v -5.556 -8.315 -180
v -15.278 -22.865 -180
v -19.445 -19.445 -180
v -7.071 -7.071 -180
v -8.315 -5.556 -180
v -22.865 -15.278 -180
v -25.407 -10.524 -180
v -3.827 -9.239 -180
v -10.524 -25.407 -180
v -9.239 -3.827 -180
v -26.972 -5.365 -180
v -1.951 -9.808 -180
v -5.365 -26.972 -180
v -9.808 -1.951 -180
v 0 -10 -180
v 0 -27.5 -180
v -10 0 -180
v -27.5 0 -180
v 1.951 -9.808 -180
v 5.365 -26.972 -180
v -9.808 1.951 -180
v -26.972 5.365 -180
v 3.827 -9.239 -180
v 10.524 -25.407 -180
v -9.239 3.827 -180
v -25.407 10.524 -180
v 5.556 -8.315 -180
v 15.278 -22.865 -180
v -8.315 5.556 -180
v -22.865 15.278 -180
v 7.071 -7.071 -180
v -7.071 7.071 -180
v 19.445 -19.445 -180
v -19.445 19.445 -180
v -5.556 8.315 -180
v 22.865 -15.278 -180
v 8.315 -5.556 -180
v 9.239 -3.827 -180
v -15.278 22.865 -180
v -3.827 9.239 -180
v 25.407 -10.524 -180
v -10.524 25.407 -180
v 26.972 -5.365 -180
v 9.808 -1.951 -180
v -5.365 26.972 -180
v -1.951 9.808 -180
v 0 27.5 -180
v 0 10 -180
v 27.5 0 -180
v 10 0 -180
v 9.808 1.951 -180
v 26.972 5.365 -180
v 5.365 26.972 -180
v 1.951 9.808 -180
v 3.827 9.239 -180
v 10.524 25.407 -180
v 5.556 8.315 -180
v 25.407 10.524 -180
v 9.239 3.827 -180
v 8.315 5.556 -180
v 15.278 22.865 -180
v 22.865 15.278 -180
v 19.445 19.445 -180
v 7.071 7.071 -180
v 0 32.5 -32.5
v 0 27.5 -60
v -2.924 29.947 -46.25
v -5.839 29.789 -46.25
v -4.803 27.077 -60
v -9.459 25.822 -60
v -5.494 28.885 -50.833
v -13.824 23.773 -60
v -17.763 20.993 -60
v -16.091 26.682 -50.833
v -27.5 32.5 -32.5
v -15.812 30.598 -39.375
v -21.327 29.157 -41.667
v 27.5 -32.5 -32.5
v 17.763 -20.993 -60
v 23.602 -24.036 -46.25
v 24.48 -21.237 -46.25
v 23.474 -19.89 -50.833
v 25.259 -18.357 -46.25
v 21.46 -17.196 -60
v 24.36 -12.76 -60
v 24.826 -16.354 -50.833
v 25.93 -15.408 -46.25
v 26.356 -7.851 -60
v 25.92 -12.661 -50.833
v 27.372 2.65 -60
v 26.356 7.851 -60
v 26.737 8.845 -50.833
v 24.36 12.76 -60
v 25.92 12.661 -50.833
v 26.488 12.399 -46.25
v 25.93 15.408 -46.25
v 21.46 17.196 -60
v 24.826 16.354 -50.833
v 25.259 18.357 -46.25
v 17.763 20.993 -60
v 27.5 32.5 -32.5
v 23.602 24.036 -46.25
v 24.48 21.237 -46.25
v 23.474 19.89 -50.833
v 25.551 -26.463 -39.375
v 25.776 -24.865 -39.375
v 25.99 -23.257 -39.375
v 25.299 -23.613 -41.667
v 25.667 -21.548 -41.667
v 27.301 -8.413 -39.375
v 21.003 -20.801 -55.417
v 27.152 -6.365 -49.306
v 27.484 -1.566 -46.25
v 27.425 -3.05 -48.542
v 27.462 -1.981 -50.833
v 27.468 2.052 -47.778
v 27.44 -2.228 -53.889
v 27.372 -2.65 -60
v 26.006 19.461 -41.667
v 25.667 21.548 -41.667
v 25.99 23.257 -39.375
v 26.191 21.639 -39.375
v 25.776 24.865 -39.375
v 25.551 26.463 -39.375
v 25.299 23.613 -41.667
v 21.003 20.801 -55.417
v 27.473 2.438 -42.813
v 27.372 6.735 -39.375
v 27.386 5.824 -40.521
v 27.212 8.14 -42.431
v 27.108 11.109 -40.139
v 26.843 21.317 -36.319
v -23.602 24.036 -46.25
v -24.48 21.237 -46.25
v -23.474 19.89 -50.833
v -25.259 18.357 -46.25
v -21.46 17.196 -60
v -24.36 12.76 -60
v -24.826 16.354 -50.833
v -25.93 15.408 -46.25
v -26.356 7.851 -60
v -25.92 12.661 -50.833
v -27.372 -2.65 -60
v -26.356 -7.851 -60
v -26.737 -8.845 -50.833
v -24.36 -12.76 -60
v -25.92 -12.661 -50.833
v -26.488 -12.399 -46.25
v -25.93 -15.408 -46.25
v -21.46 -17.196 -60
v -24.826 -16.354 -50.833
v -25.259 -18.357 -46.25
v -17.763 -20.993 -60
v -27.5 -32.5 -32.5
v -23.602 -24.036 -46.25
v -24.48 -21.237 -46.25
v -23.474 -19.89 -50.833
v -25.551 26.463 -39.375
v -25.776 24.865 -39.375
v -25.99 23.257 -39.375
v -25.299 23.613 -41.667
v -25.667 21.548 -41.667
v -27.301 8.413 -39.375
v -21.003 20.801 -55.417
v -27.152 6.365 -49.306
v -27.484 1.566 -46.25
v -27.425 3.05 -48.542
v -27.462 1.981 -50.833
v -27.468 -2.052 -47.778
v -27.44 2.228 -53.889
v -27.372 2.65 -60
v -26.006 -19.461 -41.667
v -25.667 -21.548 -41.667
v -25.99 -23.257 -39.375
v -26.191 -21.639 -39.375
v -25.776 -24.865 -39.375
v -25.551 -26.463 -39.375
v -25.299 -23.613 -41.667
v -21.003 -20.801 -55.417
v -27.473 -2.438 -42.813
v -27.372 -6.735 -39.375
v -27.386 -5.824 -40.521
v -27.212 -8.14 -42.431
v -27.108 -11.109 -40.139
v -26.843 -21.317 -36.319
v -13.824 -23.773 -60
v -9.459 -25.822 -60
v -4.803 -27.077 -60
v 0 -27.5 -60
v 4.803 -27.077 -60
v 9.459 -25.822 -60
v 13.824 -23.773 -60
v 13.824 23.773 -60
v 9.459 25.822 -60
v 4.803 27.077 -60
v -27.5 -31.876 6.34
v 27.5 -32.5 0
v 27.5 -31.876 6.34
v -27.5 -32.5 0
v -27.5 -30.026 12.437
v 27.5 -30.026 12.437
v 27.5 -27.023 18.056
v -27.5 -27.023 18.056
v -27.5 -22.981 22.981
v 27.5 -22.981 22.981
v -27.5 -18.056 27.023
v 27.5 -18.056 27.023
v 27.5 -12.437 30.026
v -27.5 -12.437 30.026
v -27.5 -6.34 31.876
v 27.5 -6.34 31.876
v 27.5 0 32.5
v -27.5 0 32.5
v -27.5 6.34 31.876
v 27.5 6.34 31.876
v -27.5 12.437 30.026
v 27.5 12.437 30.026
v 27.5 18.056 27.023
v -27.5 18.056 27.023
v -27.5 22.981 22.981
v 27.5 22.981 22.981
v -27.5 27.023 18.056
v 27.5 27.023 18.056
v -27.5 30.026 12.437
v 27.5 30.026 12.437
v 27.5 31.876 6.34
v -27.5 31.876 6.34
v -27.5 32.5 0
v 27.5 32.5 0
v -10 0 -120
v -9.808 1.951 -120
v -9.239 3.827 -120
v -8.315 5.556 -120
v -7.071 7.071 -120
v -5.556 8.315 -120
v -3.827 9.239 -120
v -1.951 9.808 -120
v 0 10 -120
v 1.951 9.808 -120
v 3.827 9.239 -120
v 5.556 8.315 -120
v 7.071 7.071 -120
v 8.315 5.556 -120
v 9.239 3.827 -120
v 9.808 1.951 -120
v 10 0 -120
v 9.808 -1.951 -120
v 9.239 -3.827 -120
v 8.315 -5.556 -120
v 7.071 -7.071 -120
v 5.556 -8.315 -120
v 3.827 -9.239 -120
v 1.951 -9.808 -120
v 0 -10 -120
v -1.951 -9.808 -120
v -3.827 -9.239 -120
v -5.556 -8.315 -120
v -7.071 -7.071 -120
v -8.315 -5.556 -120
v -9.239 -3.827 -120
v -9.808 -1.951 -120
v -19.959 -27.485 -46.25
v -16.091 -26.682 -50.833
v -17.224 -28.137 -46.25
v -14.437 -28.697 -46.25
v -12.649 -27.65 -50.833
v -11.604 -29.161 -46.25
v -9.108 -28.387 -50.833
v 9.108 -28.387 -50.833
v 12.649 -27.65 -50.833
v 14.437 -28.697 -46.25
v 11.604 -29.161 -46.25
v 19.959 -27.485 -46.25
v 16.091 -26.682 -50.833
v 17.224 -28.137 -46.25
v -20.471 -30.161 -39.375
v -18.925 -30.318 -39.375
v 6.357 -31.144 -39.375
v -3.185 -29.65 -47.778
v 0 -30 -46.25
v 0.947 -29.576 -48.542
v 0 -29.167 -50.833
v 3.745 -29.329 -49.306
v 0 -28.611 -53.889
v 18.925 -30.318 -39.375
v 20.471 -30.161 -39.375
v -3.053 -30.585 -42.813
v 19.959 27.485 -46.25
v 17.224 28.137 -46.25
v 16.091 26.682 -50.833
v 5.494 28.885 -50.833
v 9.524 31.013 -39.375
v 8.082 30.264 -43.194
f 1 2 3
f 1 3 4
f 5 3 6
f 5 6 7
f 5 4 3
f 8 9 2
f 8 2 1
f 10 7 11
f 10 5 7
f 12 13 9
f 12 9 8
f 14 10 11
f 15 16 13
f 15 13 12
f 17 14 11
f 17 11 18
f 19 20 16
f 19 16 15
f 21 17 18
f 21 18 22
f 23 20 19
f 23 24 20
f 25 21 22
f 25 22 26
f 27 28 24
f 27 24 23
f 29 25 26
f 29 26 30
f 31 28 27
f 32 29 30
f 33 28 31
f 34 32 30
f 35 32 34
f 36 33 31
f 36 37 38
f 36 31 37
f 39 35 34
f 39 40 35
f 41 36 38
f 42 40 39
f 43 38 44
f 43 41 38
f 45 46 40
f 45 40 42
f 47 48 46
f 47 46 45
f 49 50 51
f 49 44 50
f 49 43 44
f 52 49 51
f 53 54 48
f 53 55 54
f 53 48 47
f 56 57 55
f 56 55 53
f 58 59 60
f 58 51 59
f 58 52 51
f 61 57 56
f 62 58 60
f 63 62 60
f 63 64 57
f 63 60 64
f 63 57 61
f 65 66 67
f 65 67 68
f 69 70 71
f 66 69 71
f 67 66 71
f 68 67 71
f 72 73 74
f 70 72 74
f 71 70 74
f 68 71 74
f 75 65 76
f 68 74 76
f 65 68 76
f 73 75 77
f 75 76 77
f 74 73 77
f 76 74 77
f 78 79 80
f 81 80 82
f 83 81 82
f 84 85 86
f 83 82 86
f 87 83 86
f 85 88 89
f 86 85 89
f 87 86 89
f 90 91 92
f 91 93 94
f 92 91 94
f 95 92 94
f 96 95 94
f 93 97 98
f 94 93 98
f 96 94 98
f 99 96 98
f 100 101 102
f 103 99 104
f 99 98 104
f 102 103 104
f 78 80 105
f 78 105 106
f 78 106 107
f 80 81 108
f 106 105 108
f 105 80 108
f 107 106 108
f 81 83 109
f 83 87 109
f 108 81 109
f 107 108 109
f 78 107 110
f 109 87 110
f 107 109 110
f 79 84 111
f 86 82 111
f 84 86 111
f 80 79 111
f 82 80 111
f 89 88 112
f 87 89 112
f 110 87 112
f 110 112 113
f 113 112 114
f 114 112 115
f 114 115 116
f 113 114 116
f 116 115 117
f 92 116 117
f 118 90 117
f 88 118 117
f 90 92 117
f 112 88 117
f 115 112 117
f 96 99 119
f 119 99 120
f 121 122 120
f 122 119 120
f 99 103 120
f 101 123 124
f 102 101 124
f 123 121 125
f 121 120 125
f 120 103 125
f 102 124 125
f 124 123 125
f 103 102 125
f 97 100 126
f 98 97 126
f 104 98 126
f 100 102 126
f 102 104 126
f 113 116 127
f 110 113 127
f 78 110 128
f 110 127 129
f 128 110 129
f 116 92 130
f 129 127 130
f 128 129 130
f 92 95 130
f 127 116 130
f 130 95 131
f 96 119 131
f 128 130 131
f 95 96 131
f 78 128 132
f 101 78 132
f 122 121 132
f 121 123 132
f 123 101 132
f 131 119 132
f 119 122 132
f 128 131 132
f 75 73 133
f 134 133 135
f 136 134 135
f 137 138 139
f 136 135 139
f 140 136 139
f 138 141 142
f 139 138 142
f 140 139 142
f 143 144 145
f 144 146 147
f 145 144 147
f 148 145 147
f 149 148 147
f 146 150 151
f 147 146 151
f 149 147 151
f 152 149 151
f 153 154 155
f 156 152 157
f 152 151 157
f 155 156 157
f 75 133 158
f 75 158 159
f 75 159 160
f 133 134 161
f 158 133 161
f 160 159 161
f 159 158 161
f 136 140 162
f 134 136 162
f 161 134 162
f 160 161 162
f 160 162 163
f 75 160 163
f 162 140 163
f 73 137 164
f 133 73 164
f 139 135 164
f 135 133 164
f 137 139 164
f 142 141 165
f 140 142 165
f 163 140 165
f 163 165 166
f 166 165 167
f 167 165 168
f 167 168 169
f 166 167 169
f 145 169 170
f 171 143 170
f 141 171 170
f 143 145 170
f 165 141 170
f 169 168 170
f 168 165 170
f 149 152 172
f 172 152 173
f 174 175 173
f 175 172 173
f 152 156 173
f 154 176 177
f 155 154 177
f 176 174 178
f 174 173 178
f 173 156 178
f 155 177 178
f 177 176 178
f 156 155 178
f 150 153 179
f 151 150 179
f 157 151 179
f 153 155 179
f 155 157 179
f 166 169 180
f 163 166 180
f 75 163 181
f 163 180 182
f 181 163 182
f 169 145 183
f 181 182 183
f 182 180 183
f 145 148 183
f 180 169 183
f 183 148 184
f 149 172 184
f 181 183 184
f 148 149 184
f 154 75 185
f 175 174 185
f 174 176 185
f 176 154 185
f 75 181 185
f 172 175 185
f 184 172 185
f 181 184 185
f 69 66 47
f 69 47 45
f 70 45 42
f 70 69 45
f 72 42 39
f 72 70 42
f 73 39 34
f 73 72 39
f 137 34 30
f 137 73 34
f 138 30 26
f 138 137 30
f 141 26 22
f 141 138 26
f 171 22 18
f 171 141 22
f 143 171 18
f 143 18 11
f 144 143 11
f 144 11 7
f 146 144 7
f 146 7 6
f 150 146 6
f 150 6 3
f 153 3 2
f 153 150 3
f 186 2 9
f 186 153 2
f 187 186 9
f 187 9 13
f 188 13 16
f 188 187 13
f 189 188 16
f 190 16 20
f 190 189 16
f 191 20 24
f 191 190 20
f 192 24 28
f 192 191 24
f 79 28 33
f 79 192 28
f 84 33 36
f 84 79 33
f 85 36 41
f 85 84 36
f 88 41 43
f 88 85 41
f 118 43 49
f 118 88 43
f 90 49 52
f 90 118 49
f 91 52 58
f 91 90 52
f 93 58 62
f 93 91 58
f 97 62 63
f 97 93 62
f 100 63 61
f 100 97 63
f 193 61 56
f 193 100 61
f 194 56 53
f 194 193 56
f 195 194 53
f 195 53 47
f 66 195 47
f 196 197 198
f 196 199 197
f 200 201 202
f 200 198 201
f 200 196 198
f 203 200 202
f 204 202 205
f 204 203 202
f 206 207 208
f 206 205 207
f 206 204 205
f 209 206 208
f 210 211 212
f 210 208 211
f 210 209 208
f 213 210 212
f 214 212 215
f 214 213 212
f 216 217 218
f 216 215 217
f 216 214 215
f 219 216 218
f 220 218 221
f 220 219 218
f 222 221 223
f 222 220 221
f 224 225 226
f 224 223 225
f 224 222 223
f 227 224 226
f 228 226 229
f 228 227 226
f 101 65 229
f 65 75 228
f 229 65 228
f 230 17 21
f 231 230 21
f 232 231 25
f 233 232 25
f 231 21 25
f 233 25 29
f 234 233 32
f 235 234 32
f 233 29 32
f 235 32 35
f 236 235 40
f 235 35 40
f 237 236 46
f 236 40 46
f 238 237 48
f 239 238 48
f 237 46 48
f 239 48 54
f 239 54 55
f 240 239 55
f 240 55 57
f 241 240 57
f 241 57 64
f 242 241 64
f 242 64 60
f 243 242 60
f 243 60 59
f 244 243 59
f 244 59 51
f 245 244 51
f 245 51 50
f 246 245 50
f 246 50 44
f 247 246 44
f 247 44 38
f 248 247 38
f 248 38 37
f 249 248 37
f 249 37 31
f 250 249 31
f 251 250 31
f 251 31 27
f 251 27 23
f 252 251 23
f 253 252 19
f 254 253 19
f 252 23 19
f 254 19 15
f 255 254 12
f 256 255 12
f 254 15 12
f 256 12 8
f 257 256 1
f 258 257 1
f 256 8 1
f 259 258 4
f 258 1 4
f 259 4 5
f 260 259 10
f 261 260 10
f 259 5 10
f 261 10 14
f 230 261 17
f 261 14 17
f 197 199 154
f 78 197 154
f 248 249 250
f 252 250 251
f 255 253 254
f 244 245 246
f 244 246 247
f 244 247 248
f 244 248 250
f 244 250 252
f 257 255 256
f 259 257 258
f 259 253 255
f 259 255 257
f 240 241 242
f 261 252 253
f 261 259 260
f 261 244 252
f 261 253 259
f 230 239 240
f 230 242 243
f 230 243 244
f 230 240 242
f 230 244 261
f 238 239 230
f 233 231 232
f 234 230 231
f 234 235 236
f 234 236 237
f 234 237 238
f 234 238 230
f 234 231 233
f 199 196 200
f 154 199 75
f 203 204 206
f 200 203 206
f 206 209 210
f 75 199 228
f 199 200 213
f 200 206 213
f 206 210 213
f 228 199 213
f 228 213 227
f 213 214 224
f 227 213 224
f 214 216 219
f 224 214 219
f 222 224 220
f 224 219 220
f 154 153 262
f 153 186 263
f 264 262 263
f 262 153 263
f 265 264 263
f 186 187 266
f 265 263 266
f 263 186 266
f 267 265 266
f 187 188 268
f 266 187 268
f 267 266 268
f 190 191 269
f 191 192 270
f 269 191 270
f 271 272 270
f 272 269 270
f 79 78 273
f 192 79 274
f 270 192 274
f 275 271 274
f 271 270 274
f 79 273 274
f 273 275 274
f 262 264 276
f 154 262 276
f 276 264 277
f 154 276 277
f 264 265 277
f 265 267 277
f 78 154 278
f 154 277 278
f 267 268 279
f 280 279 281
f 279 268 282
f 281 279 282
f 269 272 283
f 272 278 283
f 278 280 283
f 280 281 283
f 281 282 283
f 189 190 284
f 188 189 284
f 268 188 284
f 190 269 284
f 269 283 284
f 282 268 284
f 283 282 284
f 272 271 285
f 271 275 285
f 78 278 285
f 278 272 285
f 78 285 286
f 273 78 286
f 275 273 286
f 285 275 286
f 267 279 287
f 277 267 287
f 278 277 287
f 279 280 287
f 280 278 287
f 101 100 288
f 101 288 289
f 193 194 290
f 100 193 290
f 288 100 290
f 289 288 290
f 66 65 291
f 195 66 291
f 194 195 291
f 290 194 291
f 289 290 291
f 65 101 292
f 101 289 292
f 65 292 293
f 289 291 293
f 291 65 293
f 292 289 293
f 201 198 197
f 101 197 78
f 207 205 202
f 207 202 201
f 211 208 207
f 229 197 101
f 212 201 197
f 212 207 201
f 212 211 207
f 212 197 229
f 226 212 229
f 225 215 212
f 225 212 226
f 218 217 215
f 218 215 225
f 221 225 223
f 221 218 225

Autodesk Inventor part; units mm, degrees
sketch "Sketch6" plane through (0, 0, 0) normal (1, 0, 0) x (0, 1, 0)
  circle A0 centre (0, 0) radius 32.5
  line L0 (-32.5, 0) -> (-32.5, -60)
  line L1 (-32.5, -60) -> (32.5, -60)
  line L2 (32.5, -60) -> (32.5, 0)
  line L3 (0, 0) -> (0, -60) construction
  line L4 (-32.5, -32.5) -> (32.5, -32.5)
  dimension "d38" = 65
  dimension "d39" = 60
extrude "Extrusion8" add sketch "Sketch6" along normal mid plane 55 contours A0 | L2 L4 A0 | A0 L4 L0
ref_plane "Work Plane2" through (0, -32.5, -60) normal (0, 0, -1) x (0, 1, 0)
ref_plane "Work Plane1" through (0, 0, 27.5) normal (0, 0, 1) x (1, 0, 0)
sketch "Sketch3" plane through (0, -32.5, -60) normal (0, 0, -1) x (0, 1, 0)
  circle A0 centre (32.5, 0) radius 27.5
  line L0 (65, -27.5) -> (65, 27.5) projected
  circle A1 centre (32.5, 0) radius 37.5
  dimension "d48" = 10
  dimension "d73" = 55
loft "Loft1" add profiles "Sketch3" section 1 edges at (0, 32.5, -32.5) (27.5, 0, -32.5) (0, -32.5, -32.5) (-27.5, 0, -32.5) contours A0
sketch "Sketch7" plane through (0, 0, 0) normal (1, 0, 0) x (0, 1, 0)
  line L0 (20.9931, -60) -> (-20.9931, -60) projected
  line L1 (0, -60) -> (0, -180)
  point P0 (0, 0)
  dimension "d52" = 120
ref_plane "Work Plane3" through (0, 0, -180) normal (0, 0, -1) x (-1, 0, 0)
extrude "Extrusion1" add sketch "Sketch3" along normal blind 120 contours A0
sketch "Sketch5" plane through (0, 0, -180) normal (0, 0, -1) x (-1, 0, 0)
  circle A0 centre (0, 0) radius 10
  point P0 (0, 0)
  dimension "d35" = 20
extrude "Extrusion7" cut sketch "Sketch5" against normal blind 60
properties part number "shank_2"
